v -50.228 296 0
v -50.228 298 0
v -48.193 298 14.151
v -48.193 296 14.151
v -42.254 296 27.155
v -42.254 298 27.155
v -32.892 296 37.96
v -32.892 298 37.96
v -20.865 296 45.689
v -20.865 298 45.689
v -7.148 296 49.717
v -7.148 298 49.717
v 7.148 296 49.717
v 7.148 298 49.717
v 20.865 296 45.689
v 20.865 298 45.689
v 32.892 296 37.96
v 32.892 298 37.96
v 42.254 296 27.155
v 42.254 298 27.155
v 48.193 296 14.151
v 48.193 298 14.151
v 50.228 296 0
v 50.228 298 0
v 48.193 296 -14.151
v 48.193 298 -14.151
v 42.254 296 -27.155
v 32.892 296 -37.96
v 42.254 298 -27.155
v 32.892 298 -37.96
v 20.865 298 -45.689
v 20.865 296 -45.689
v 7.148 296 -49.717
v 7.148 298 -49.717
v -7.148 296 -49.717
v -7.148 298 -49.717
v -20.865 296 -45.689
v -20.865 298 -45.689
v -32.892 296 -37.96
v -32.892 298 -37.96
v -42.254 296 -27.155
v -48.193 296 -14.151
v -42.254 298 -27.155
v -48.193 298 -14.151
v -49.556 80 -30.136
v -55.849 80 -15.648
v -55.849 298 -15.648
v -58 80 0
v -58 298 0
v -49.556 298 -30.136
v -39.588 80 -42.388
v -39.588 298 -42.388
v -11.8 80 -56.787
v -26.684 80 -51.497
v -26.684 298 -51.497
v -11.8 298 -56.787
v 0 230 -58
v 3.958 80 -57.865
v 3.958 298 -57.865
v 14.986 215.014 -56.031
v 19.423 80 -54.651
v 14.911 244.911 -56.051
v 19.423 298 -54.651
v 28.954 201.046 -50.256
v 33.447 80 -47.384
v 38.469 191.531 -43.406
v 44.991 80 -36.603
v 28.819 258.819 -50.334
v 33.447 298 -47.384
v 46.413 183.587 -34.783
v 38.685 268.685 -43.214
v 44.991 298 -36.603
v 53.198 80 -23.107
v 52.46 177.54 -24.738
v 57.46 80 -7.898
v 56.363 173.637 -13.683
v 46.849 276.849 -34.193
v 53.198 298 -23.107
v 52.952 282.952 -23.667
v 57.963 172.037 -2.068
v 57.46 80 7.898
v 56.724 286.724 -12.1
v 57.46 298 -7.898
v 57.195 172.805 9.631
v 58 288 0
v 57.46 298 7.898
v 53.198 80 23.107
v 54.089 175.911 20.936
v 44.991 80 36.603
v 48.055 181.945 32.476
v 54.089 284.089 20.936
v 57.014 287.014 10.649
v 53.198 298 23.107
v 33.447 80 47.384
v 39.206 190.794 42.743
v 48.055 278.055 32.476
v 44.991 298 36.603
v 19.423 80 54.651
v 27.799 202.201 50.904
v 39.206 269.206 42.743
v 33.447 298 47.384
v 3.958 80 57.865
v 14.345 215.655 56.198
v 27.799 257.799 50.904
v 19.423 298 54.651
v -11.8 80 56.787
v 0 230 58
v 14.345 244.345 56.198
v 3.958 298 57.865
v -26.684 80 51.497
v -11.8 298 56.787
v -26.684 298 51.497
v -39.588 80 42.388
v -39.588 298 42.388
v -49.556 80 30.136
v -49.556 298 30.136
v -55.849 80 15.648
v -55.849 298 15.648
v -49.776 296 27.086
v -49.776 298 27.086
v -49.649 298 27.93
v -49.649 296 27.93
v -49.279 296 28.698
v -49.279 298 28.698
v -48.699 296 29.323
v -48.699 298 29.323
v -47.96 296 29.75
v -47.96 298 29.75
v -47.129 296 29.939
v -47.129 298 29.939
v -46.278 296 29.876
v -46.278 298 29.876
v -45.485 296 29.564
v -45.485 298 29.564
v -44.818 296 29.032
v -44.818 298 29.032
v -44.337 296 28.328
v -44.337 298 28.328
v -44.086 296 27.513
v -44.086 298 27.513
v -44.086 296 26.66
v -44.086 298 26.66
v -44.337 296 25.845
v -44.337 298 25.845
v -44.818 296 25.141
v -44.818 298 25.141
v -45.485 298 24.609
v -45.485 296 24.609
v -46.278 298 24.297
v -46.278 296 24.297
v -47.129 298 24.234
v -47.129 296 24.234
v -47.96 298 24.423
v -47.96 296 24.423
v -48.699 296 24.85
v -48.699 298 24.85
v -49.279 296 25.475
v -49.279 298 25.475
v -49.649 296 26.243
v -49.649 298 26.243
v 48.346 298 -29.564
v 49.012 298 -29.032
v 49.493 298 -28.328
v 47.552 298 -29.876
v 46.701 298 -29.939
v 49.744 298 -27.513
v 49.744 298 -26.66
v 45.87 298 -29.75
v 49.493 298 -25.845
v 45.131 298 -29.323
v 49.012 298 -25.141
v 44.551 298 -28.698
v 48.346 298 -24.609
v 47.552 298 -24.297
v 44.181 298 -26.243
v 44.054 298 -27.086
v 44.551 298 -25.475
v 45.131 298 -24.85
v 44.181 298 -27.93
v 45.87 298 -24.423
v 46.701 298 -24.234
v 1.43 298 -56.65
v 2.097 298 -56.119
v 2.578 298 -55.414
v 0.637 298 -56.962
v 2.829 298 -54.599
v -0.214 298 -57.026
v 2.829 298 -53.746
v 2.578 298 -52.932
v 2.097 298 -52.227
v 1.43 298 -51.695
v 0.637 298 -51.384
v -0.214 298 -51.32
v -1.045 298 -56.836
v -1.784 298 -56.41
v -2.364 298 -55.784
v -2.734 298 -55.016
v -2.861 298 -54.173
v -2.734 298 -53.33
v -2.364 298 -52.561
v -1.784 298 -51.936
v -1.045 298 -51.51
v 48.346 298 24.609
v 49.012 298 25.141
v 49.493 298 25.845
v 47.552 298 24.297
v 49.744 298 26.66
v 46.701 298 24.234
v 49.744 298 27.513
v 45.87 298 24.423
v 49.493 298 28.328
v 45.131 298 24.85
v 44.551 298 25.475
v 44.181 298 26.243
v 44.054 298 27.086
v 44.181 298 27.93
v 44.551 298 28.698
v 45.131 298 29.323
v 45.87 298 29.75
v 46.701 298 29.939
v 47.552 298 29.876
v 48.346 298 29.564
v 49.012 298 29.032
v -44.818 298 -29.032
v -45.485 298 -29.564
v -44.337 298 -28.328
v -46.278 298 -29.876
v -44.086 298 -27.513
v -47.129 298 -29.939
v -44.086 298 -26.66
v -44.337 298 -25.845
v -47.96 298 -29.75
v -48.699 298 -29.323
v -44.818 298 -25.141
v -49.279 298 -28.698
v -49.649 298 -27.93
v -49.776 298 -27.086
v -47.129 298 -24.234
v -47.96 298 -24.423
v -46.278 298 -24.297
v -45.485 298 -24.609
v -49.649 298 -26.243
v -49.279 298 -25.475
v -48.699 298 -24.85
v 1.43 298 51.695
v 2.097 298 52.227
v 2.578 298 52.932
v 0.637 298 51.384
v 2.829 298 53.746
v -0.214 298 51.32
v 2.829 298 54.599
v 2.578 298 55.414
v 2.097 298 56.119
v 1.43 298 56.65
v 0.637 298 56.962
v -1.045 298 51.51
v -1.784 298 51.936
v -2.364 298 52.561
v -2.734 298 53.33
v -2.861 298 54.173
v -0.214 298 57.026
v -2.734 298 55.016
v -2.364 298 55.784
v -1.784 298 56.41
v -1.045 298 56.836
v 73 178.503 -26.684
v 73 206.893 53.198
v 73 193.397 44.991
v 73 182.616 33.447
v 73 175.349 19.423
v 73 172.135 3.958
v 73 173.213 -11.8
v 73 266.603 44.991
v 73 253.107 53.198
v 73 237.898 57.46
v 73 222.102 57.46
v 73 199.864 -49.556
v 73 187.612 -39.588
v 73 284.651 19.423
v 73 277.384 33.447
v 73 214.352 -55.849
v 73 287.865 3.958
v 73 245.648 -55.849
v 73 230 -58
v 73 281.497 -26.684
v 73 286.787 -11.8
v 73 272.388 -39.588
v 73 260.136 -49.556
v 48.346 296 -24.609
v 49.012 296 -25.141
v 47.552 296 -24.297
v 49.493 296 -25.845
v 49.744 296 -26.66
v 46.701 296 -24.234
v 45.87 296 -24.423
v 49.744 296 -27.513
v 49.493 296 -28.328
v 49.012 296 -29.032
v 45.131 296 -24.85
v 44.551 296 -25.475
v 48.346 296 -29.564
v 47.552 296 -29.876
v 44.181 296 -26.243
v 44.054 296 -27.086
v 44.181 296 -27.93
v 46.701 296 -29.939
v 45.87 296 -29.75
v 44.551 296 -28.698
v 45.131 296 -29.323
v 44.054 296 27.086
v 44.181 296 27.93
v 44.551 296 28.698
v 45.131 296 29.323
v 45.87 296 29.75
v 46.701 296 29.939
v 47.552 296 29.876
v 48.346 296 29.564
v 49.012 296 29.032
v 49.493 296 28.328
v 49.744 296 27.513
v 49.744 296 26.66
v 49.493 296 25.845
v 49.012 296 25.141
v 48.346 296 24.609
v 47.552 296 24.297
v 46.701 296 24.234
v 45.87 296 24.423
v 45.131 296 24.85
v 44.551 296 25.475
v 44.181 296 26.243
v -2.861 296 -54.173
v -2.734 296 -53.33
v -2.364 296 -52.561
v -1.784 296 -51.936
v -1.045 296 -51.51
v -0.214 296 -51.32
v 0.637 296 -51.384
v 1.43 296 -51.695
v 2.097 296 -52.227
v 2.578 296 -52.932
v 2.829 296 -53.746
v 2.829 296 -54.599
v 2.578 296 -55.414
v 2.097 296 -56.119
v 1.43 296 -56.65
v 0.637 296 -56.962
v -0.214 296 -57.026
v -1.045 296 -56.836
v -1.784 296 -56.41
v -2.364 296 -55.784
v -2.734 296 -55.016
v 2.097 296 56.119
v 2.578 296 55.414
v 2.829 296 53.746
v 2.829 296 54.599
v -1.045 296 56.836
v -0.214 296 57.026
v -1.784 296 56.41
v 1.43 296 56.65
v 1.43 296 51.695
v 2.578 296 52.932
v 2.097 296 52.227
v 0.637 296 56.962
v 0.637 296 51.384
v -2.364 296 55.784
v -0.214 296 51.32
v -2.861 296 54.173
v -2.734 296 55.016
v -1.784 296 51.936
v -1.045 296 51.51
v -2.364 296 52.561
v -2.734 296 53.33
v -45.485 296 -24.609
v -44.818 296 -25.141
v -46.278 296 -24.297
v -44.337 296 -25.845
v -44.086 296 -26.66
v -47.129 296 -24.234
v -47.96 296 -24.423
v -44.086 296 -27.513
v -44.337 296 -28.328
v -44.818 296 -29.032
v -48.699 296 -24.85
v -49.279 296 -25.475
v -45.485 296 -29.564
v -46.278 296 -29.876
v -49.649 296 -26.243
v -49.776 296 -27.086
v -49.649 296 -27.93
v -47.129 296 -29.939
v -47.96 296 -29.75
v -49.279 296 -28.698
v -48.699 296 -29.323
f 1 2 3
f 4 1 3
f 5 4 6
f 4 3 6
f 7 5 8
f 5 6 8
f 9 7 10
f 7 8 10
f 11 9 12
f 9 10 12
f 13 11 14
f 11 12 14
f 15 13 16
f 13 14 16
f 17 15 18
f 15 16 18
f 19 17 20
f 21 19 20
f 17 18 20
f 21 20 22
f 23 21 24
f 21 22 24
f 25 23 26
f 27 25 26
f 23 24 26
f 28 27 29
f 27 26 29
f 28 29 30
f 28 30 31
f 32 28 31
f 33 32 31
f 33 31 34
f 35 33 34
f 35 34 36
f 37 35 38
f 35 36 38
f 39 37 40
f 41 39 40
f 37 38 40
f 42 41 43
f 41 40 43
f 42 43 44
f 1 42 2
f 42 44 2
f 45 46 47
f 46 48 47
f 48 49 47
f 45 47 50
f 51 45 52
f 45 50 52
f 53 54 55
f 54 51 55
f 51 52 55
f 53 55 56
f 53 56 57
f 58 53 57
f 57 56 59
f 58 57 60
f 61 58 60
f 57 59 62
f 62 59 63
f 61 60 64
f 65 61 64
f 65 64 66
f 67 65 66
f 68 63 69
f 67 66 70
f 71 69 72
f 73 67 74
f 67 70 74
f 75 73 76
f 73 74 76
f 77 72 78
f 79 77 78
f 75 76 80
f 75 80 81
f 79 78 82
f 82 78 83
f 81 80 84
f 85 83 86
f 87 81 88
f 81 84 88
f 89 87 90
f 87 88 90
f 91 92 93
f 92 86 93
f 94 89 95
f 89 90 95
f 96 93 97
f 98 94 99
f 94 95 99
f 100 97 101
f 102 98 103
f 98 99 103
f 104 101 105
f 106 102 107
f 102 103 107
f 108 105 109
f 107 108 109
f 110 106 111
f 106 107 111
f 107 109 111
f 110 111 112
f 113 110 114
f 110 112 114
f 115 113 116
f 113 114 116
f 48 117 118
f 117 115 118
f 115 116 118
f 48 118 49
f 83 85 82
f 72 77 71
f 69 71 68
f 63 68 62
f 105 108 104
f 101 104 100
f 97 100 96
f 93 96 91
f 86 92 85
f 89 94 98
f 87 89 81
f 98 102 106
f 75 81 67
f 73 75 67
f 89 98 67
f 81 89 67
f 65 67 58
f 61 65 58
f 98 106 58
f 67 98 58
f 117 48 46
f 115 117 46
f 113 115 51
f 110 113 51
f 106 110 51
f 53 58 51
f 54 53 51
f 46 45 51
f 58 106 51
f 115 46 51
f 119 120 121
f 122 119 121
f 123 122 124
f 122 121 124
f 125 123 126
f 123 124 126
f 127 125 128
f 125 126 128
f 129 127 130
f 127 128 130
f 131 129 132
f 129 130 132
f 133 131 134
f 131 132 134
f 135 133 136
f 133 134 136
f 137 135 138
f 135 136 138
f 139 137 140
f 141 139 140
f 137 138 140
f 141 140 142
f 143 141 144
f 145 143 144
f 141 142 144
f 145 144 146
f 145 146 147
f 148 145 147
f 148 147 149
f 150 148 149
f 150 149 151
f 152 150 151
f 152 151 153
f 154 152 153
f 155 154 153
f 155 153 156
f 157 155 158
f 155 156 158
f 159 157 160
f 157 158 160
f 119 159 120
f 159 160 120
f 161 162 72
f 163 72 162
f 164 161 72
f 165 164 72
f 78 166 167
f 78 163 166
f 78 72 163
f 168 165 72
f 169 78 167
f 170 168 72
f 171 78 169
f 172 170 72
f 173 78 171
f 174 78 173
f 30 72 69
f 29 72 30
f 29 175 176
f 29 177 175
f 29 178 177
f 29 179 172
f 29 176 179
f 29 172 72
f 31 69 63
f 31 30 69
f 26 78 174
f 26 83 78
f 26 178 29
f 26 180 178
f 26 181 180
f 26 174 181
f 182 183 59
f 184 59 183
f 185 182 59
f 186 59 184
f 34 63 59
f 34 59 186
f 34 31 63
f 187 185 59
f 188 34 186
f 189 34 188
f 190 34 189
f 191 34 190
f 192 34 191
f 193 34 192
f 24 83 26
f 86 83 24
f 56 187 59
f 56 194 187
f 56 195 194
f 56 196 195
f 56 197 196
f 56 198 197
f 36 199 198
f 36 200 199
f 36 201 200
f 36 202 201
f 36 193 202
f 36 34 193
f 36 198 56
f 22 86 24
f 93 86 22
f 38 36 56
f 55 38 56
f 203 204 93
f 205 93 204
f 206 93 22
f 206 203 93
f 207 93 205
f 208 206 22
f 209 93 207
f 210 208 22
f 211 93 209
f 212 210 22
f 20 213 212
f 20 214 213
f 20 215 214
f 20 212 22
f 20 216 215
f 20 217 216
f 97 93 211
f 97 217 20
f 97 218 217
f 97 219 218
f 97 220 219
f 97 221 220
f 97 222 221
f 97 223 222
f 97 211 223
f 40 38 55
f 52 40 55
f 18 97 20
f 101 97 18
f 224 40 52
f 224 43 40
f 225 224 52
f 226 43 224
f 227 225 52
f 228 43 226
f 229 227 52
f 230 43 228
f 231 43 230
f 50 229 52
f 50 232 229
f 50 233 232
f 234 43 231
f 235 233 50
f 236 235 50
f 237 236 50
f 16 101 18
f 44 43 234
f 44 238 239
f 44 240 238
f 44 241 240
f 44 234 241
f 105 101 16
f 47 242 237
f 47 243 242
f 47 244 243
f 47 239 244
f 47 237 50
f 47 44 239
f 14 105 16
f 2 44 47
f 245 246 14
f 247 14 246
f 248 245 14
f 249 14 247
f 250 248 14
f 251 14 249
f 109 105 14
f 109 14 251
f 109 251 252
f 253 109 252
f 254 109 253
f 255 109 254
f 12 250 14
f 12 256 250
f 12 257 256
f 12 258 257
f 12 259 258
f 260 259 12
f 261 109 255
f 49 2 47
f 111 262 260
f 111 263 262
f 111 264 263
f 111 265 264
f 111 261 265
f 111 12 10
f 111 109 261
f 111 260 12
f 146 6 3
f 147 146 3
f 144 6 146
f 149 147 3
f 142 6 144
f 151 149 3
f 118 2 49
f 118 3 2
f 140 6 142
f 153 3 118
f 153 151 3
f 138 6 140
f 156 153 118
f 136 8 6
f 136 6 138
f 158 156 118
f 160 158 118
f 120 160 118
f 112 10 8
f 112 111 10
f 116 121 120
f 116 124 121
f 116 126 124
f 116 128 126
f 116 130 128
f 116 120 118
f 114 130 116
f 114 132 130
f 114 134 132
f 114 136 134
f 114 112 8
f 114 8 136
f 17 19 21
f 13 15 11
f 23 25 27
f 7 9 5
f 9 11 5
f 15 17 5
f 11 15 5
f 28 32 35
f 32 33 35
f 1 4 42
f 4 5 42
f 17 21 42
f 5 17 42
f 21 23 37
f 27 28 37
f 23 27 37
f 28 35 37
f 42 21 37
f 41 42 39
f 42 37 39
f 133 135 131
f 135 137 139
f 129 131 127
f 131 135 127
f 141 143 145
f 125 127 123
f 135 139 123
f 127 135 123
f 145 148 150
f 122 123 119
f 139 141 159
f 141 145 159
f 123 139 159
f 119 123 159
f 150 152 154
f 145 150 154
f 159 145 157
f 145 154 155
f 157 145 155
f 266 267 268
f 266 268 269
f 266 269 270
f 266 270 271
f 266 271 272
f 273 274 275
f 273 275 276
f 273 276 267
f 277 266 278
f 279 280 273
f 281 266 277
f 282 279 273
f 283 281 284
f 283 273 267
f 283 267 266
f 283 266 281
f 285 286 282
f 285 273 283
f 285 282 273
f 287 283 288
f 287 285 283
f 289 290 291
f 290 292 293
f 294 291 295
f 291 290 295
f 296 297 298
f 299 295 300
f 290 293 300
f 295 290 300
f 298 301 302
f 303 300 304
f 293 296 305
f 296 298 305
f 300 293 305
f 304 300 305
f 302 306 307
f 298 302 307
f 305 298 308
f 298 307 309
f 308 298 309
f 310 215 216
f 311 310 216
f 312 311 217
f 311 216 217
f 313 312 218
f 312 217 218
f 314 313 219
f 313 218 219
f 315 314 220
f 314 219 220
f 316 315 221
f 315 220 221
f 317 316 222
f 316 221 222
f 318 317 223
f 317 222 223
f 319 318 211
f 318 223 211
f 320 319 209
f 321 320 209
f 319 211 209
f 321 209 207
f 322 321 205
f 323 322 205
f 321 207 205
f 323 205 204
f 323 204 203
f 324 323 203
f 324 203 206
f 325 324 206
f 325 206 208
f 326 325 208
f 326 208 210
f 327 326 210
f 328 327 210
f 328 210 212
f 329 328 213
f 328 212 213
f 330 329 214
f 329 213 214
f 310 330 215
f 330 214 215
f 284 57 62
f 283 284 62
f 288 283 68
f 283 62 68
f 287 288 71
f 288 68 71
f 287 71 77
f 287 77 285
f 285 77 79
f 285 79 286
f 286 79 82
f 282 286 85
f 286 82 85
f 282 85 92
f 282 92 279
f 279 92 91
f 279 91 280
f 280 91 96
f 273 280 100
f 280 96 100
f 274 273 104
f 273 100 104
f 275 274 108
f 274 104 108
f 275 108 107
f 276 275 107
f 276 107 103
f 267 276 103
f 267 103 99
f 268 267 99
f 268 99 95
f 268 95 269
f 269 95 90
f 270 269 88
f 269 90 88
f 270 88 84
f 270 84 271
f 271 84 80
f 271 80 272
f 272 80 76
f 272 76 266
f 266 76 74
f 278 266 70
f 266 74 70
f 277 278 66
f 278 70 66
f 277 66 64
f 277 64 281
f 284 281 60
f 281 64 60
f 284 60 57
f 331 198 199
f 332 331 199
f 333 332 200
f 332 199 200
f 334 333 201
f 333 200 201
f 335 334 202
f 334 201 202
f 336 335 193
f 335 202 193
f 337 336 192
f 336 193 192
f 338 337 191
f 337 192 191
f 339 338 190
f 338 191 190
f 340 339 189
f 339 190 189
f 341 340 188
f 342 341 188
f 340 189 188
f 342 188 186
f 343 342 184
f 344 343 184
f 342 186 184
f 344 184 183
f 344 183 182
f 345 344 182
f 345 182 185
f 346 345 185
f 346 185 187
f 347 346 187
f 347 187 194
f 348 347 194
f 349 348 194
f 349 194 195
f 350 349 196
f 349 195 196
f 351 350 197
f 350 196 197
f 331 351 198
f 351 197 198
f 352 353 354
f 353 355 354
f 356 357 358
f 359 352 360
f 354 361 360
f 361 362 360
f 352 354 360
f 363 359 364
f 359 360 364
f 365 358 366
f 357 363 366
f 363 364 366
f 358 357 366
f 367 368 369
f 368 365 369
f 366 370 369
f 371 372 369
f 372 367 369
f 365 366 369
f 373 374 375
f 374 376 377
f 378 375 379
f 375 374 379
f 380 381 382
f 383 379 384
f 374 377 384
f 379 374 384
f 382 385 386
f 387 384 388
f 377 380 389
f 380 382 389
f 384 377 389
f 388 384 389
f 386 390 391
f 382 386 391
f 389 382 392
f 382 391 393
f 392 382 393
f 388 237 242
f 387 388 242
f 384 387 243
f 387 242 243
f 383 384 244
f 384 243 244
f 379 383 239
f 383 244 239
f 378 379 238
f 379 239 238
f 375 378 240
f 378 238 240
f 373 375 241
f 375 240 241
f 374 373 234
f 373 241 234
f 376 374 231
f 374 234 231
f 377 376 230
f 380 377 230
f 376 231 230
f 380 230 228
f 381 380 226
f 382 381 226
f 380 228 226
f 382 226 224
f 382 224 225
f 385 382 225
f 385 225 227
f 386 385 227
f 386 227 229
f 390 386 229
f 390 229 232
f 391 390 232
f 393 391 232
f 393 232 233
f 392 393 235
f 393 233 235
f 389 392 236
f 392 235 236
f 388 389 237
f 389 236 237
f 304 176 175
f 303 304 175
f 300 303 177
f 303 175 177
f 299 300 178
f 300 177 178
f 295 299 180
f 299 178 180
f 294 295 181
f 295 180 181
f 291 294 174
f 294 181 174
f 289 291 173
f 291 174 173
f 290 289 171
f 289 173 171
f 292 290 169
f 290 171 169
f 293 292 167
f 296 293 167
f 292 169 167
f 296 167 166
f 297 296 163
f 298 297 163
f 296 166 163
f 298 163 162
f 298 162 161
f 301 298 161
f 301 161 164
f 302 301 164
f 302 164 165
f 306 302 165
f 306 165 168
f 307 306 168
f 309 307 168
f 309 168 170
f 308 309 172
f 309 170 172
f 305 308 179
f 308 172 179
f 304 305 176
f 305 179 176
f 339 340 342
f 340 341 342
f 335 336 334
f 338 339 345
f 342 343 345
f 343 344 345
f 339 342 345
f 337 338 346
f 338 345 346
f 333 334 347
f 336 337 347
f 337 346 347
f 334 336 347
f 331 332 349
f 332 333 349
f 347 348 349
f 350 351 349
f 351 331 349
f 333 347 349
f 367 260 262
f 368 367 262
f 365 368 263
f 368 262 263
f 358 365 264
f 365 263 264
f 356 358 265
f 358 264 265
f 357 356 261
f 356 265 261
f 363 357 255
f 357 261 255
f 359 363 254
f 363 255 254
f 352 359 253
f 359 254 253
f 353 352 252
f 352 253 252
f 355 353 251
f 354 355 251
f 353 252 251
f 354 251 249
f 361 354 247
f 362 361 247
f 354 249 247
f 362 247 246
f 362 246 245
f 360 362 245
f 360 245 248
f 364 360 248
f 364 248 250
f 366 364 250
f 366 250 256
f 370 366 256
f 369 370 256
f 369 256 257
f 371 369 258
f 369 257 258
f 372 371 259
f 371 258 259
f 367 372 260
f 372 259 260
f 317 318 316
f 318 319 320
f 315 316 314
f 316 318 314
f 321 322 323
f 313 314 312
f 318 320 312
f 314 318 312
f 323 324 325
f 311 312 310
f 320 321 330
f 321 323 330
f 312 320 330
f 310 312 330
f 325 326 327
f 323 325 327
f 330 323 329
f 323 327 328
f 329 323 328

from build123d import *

# Parameters (mm, degrees)
CORTAR_EXTRUIR4_DEPTH      = 312.012057644
SALIENTE_EXTRUIR1_START    = -30
CROQUIS4_R                 = 67.5
SALIENTE_EXTRUIR1_DEPTH    = 30
SALIENTE_EXTRUIR2_START    = 2
CROQUIS5_R                 = 58
CROQUIS5_R_2               = 50.227847336
CROQUIS5_R_3               = 2.860878396
SALIENTE_EXTRUIR2_DEPTH    = 2
CROQUIS6_R                 = 58
SALIENTE_EXTRUIR3_DEPTH    = 73
CORTAR_EXTRUIR5_DEPTH      = 315.148452169
CORTAR_EXTRUIR5_DEPTH_BACK = 315.148452169
CROQUIS7_W                 = 212.825411986
CROQUIS7_H                 = 84.990442804


with BuildPart() as part:
    # Croquis2 → Revolución1 (revolve)
    with BuildSketch(Plane.XY):
        Polygon((0, 0), (-67.5, 0), (-67.5, 26.689315597), (-58, 80), (-58, 296), (0, 296), align=None)
    revolve(axis=Axis((0, 296, 0), (0, -1, 0)))

    # Croquis3 → Cortar-Extruir4 (cut, through all)
    with BuildSketch(Plane(origin=(0, 296, 0), x_dir=(1, 0, 0), z_dir=(0, 1, 0))):
        Polygon((0, 58), (-8.909431544, 66.909431544), (8.909431544, 66.909431544), align=None)
        Polygon((66.909431544, -8.909431544), (58, 0), (66.909431544, 8.909431544), align=None)
        Polygon((-8.909431544, -66.909431544), (0, -58), (8.909431544, -66.909431544), align=None)
        Polygon((-66.909431544, 8.909431544), (-58, 0), (-66.909431544, -8.909431544), align=None)
    extrude(amount=-CORTAR_EXTRUIR4_DEPTH, mode=Mode.SUBTRACT)

    # Croquis4 → Saliente-Extruir1 (add)
    with BuildSketch(Plane.XZ.offset(SALIENTE_EXTRUIR1_START)):
        with Locations(Location((0, 0, 0), (0, 0, 180))):
            Circle(CROQUIS4_R)
    extrude(amount=SALIENTE_EXTRUIR1_DEPTH)

    # Croquis5 → Saliente-Extruir2 (add)
    with BuildSketch(Plane(origin=(0, 296, 0), x_dir=(1, 0, 0), z_dir=(0, 1, 0)).offset(SALIENTE_EXTRUIR2_START)):
        with Locations(Location((0, 0, 0), (0, 0, 180))):
            Circle(CROQUIS5_R)
        with Locations(Location((0, 0, 0), (0, 0, 180))):
            Circle(CROQUIS5_R_2, mode=Mode.SUBTRACT)
        with Locations(Location((0, 54.172847051, 0), (0, 0, 180))):
            Circle(CROQUIS5_R_3, mode=Mode.SUBTRACT)
        with Locations(Location((46.915061741, 27.086423525, 0), (0, 0, 180))):
            Circle(CROQUIS5_R_3, mode=Mode.SUBTRACT)
        with Locations(Location((46.915061741, -27.086423525, 0), (0, 0, 180))):
            Circle(CROQUIS5_R_3, mode=Mode.SUBTRACT)
        with Locations(Location((0, -54.172847051, 0), (0, 0, 180))):
            Circle(CROQUIS5_R_3, mode=Mode.SUBTRACT)
        with Locations(Location((-46.915061741, -27.086423525, 0), (0, 0, 180))):
            Circle(CROQUIS5_R_3, mode=Mode.SUBTRACT)
        with Locations(Location((-46.915061741, 27.086423525, 0), (0, 0, 180))):
            Circle(CROQUIS5_R_3, mode=Mode.SUBTRACT)
    extrude(amount=-SALIENTE_EXTRUIR2_DEPTH)

    # Croquis6 → Saliente-Extruir3 (add)
    with BuildSketch(Plane(origin=(0, 0, 0), x_dir=(0, 0, -1), z_dir=(1, 0, 0))):
        with Locations((0, 230)):
            Circle(CROQUIS6_R)
    extrude(amount=SALIENTE_EXTRUIR3_DEPTH)

    # Croquis7 → Cortar-Extruir5 (cut, two sides: drawn at the far end of the back side and taken through both)
    with BuildSketch(Plane(origin=(0, 0, 0), x_dir=(0, 0, -1), z_dir=(1, 0, 0)).offset(-CORTAR_EXTRUIR5_DEPTH_BACK)):
        with Locations((5.734816491, 37.504778598)):
            Rectangle(CROQUIS7_W, CROQUIS7_H)
    extrude(amount=CORTAR_EXTRUIR5_DEPTH + CORTAR_EXTRUIR5_DEPTH_BACK, mode=Mode.SUBTRACT)


solid = part.part
